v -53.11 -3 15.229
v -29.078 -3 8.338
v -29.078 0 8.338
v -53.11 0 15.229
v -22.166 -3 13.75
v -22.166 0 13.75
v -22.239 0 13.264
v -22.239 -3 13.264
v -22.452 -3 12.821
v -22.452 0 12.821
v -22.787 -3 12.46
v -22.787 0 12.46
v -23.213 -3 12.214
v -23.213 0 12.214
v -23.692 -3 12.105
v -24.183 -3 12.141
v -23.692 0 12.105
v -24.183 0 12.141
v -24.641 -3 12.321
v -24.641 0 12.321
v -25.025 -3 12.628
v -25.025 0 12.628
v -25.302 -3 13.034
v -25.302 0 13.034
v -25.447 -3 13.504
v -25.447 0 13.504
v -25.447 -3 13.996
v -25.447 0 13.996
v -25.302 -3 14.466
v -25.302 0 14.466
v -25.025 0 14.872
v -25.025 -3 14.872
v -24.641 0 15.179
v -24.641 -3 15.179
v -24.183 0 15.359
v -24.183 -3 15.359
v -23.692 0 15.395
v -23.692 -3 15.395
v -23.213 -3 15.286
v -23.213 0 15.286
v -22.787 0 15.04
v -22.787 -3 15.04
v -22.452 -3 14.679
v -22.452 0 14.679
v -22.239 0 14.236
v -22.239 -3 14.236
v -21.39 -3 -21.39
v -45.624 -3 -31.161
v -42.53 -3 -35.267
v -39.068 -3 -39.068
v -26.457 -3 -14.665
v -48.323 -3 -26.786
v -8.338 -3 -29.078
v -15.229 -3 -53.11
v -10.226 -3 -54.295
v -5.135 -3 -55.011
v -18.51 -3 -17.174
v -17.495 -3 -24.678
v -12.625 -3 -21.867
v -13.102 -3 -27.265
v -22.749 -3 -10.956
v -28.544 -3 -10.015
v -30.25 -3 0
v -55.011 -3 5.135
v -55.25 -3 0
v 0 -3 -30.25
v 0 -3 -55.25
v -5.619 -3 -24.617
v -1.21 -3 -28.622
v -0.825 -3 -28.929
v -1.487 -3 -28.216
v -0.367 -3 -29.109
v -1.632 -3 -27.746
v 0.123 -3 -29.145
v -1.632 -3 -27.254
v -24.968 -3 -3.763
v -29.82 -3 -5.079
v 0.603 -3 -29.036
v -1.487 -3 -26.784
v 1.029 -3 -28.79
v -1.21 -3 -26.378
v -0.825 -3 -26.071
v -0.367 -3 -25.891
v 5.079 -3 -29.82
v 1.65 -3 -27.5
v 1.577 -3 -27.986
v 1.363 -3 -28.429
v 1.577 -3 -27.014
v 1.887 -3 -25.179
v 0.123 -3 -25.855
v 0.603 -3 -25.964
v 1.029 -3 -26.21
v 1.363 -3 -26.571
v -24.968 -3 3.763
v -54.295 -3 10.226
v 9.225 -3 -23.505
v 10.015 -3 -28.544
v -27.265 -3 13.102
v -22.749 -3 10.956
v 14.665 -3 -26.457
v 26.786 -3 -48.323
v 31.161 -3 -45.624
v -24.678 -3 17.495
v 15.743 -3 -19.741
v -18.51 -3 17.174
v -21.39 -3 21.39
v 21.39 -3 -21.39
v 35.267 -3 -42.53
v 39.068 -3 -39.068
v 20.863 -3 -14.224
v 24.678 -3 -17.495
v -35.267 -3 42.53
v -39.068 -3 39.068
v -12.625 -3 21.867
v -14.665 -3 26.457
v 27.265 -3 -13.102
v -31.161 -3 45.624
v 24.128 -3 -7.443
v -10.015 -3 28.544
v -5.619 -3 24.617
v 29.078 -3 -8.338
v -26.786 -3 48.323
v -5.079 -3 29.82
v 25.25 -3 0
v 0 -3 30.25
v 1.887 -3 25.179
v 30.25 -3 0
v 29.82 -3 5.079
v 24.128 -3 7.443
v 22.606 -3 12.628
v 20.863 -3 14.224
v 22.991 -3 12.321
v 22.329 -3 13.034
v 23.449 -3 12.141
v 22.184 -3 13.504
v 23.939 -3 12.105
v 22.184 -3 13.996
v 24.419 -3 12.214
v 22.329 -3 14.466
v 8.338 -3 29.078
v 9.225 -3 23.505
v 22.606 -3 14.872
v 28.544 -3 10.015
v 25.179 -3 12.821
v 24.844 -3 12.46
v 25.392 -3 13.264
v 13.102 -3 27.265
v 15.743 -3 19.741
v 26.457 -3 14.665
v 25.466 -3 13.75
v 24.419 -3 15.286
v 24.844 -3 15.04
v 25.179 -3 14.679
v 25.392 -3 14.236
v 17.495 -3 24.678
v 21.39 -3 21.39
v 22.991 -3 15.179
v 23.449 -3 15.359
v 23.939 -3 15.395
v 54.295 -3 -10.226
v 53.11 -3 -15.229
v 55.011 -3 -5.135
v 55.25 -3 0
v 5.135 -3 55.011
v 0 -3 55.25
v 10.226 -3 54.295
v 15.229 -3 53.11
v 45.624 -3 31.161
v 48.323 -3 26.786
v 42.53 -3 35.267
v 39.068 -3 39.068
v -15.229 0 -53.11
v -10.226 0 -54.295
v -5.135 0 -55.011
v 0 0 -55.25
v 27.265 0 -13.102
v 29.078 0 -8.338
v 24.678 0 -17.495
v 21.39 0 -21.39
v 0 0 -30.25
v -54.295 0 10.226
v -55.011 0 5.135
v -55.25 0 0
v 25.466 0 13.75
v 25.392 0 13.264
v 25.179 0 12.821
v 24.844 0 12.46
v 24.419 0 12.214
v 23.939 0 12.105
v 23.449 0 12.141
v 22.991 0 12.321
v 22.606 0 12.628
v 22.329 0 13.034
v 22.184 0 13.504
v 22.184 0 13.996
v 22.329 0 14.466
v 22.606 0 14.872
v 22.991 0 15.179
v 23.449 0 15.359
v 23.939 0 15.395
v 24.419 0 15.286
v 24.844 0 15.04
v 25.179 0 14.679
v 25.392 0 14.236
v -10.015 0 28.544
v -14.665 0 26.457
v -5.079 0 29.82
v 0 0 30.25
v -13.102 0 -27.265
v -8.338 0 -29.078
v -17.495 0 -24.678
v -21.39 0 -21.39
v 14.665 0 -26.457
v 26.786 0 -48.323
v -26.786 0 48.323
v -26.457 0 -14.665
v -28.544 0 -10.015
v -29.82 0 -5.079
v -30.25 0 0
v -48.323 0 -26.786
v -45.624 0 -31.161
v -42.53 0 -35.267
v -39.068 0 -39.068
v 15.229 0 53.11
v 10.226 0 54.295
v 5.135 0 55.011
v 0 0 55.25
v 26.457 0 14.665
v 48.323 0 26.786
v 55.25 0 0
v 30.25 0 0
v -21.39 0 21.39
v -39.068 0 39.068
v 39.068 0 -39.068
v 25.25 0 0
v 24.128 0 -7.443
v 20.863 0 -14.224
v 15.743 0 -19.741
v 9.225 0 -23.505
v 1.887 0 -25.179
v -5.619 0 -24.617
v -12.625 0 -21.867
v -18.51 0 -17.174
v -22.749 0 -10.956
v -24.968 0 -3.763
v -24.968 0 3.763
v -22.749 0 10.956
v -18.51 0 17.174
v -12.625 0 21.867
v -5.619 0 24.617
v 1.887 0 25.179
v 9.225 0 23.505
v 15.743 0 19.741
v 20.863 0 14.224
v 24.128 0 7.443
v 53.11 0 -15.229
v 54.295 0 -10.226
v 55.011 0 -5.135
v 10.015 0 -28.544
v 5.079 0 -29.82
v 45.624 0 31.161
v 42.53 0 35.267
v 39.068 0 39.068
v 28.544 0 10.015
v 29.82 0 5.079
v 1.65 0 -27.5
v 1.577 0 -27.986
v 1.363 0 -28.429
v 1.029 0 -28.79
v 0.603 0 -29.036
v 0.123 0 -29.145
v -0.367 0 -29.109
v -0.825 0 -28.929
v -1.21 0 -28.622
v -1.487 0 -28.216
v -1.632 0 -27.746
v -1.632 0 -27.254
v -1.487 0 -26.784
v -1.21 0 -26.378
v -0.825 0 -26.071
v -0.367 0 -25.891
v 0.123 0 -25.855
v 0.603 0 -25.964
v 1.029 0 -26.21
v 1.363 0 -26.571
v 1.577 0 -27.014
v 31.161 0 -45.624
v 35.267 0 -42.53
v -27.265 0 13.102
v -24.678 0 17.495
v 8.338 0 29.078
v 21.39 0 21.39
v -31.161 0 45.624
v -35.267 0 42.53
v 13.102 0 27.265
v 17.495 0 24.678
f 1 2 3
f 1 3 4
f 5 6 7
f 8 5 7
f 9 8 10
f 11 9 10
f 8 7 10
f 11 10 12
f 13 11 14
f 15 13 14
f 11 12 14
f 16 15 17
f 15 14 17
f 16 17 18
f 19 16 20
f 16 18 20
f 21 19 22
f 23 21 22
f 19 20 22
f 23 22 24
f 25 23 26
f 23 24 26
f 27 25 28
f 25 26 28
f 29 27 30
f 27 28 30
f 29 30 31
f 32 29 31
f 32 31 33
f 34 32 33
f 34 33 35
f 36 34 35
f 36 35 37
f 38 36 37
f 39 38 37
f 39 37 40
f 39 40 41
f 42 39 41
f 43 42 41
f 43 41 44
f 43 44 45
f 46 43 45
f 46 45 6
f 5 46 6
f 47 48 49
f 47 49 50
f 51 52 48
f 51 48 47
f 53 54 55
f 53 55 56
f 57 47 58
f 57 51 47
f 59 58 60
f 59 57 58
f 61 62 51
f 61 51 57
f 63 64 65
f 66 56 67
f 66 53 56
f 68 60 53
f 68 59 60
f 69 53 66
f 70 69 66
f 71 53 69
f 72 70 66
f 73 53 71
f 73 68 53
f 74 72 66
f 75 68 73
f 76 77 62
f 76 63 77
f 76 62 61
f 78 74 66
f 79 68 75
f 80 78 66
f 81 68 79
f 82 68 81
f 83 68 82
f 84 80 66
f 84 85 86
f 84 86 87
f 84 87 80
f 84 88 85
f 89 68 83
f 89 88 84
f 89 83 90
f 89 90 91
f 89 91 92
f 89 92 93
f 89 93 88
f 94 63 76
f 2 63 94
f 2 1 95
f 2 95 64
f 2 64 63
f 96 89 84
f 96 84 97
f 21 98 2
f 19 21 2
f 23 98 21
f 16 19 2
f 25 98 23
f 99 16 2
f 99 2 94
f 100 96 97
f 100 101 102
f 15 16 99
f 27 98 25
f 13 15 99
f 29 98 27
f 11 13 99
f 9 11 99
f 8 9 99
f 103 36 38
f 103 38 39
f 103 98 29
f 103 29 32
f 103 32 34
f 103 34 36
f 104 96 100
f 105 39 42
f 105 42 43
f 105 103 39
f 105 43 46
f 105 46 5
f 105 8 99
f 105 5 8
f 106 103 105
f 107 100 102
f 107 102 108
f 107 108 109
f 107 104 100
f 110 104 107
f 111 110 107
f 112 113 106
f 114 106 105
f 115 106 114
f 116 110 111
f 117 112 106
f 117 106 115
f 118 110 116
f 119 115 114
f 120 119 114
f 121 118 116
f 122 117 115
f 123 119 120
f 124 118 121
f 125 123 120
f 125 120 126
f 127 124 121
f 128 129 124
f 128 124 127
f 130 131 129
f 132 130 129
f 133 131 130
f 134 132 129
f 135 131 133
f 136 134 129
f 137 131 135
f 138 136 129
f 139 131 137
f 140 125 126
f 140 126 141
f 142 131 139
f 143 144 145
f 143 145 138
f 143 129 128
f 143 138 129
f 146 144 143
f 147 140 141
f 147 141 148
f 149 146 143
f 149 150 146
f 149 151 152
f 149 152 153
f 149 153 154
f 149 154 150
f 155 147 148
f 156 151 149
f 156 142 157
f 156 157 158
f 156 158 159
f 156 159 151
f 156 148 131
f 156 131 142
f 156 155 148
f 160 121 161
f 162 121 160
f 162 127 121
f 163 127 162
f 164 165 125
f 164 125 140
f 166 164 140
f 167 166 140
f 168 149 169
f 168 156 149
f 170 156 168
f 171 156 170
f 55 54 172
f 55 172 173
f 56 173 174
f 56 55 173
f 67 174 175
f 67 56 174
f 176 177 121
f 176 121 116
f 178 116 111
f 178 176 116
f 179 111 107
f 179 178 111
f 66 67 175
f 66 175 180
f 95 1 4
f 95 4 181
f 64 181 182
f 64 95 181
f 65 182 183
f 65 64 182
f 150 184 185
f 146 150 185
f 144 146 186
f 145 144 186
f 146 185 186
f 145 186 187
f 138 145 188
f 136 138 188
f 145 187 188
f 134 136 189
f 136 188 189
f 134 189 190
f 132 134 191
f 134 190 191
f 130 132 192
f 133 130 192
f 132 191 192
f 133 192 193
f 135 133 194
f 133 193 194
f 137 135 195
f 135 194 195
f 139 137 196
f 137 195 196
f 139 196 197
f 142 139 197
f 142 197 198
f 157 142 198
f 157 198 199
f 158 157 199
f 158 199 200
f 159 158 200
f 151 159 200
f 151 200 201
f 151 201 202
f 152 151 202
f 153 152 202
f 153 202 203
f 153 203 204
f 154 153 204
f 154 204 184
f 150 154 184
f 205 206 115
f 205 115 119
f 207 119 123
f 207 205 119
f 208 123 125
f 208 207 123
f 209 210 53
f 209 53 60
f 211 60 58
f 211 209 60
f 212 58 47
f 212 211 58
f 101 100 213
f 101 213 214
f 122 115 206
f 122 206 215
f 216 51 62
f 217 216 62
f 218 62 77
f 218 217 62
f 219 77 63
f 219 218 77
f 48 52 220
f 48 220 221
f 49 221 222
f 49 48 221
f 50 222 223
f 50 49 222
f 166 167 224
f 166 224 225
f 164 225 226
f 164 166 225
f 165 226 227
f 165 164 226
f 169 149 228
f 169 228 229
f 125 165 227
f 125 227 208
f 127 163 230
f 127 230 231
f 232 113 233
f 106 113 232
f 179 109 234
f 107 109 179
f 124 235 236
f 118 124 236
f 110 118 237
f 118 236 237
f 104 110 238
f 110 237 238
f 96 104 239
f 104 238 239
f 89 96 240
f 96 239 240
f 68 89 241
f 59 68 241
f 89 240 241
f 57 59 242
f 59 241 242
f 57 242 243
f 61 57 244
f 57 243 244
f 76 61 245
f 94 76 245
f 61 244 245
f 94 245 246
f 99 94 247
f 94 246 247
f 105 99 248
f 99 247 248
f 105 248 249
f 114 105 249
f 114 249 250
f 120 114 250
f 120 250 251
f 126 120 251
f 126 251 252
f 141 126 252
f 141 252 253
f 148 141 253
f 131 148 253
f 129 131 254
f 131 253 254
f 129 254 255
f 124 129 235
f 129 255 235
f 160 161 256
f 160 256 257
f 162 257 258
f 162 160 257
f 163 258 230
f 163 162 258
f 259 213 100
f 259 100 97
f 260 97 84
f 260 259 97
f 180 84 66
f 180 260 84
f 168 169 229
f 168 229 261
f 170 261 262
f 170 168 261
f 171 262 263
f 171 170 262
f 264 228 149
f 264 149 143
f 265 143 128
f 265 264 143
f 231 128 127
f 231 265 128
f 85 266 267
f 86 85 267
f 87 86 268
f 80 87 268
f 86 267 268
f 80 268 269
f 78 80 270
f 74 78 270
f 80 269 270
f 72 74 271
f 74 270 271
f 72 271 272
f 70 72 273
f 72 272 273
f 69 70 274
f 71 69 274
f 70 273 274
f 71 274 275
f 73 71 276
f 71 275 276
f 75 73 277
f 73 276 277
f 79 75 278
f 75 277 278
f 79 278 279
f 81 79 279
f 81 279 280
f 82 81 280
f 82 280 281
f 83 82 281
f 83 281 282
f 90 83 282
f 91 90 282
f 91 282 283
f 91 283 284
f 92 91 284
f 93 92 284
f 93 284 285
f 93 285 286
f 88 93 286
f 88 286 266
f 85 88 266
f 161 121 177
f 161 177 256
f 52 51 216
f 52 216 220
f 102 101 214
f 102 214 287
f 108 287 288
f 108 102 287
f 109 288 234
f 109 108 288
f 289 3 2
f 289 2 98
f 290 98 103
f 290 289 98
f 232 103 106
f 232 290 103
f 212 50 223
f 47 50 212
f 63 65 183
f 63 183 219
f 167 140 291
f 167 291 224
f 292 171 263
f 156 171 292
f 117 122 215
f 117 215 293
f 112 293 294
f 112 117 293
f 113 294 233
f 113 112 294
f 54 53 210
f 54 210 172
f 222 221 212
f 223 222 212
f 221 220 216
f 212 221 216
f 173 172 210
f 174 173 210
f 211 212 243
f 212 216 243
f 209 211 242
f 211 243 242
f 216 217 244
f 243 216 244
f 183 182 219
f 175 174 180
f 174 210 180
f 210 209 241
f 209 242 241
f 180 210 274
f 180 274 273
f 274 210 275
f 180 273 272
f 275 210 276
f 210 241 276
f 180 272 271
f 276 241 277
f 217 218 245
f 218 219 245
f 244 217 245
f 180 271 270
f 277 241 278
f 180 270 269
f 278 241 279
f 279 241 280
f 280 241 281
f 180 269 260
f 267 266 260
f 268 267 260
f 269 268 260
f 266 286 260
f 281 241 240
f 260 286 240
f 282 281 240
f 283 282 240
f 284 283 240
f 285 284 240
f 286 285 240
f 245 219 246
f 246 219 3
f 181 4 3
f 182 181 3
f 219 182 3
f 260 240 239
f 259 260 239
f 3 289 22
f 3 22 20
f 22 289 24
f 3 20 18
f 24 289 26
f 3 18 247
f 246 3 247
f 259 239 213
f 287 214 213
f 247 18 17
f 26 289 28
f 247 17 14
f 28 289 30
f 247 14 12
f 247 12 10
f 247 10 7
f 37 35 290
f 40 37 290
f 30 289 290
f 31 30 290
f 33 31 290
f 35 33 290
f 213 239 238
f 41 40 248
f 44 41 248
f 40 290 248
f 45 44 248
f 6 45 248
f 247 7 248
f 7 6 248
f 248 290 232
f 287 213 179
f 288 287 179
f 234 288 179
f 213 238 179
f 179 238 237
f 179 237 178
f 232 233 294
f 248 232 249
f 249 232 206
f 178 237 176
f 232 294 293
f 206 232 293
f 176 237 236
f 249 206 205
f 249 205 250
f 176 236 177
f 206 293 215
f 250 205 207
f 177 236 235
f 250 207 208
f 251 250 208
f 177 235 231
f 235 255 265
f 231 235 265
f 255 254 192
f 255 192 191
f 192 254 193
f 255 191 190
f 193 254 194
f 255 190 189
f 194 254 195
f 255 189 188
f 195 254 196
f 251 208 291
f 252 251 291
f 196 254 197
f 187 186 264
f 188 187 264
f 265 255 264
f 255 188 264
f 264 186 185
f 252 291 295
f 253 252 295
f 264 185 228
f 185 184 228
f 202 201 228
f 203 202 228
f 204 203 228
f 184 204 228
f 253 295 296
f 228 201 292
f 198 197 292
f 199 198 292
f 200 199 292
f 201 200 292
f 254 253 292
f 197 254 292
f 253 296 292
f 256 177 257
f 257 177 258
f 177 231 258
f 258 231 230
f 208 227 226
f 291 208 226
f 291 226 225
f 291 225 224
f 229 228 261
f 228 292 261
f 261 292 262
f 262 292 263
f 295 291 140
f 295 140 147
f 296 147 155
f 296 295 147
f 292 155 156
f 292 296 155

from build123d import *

# Parameters (mm, degrees)
SKETCH1_R           = 30.25
SKETCH1_R_2         = 25.25
EXTRUDE_THIN1_DEPTH = 3
SKETCH2_R           = 1.65
CUT_EXTRUDE3_DEPTH  = 10
BOSS_EXTRUDE1_DEPTH = 3


with BuildPart() as part:
    # Sketch1 → Extrude-Thin1 (new body)
    with BuildSketch(Plane(origin=(0, 0, 0), x_dir=(1, 0, 0), z_dir=(0, 1, 0))):
        Circle(SKETCH1_R)
        Circle(SKETCH1_R_2, mode=Mode.SUBTRACT)
    extrude(amount=-EXTRUDE_THIN1_DEPTH)

    # Sketch2 → Cut-Extrude3 (cut)
    with BuildSketch(Plane(origin=(0, 0, 0), x_dir=(1, 0, 0), z_dir=(0, 1, 0))):
        with Locations((0, 27.5)):
            Circle(SKETCH2_R)
        with Locations((23.815698604, -13.75)):
            Circle(SKETCH2_R)
        with Locations((-23.815698604, -13.75)):
            Circle(SKETCH2_R)
    extrude(amount=-CUT_EXTRUDE3_DEPTH, mode=Mode.SUBTRACT)

    # Sketch5 → Boss-Extrude1 (add)
    with BuildSketch(Plane.XZ.offset(3)):
        with BuildLine():
            Line((0, 55.25), (0, 30.25))
            ThreePointArc((0, 30.25), (4.209986304, 29.955609079), (8.338030013, 29.078166302))
            Line((8.338030013, 29.078166302), (15.228963909, 53.109708701))
            ThreePointArc((15.228963909, 53.109708701), (7.689313828, 54.712310798), (0, 55.25))
        make_face()
        with BuildLine():
            Line((39.067649661, 39.067649661), (21.389980131, 21.389980131))
            ThreePointArc((21.389980131, 21.389980131), (24.158724179, 18.20490445), (26.457246141, 14.665491012))
            Line((26.457246141, 14.665491012), (48.322738819, 26.785731519))
            ThreePointArc((48.322738819, 26.785731519), (44.12461193, 33.250280029), (39.067649661, 39.067649661))
        make_face()
        with BuildLine():
            Line((55.25, 0), (30.25, 0))
            ThreePointArc((30.25, 0), (29.955609079, -4.209986304), (29.078166302, -8.338030013))
            Line((29.078166302, -8.338030013), (53.109708701, -15.228963909))
            ThreePointArc((53.109708701, -15.228963909), (54.712310798, -7.689313828), (55.25, 0))
        make_face()
        with BuildLine():
            Line((39.067649661, -39.067649661), (21.389980131, -21.389980131))
            ThreePointArc((21.389980131, -21.389980131), (18.20490445, -24.158724179), (14.665491012, -26.457246141))
            Line((14.665491012, -26.457246141), (26.785731519, -48.322738819))
            ThreePointArc((26.785731519, -48.322738819), (33.250280029, -44.12461193), (39.067649661, -39.067649661))
        make_face()
        with BuildLine():
            Line((0, -55.25), (0, -30.25))
            ThreePointArc((0, -30.25), (-4.209986304, -29.955609079), (-8.338030013, -29.078166302))
            Line((-8.338030013, -29.078166302), (-15.228963909, -53.109708701))
            ThreePointArc((-15.228963909, -53.109708701), (-7.689313828, -54.712310798), (0, -55.25))
        make_face()
        with BuildLine():
            Line((-39.067649661, -39.067649661), (-21.389980131, -21.389980131))
            ThreePointArc((-21.389980131, -21.389980131), (-24.158724179, -18.20490445), (-26.457246141, -14.665491012))
            Line((-26.457246141, -14.665491012), (-48.322738819, -26.785731519))
            ThreePointArc((-48.322738819, -26.785731519), (-44.12461193, -33.250280029), (-39.067649661, -39.067649661))
        make_face()
        with BuildLine():
            Line((-55.25, 0), (-30.25, 0))
            ThreePointArc((-30.25, 0), (-29.955609079, 4.209986304), (-29.078166302, 8.338030013))
            Line((-29.078166302, 8.338030013), (-53.109708701, 15.228963909))
            ThreePointArc((-53.109708701, 15.228963909), (-54.712310798, 7.689313828), (-55.25, 0))
        make_face()
        with BuildLine():
            Line((-39.067649661, 39.067649661), (-21.389980131, 21.389980131))
            ThreePointArc((-21.389980131, 21.389980131), (-18.20490445, 24.158724179), (-14.665491012, 26.457246141))
            Line((-14.665491012, 26.457246141), (-26.785731519, 48.322738819))
            ThreePointArc((-26.785731519, 48.322738819), (-33.250280029, 44.12461193), (-39.067649661, 39.067649661))
        make_face()
    extrude(amount=-BOSS_EXTRUDE1_DEPTH)


solid = part.part
